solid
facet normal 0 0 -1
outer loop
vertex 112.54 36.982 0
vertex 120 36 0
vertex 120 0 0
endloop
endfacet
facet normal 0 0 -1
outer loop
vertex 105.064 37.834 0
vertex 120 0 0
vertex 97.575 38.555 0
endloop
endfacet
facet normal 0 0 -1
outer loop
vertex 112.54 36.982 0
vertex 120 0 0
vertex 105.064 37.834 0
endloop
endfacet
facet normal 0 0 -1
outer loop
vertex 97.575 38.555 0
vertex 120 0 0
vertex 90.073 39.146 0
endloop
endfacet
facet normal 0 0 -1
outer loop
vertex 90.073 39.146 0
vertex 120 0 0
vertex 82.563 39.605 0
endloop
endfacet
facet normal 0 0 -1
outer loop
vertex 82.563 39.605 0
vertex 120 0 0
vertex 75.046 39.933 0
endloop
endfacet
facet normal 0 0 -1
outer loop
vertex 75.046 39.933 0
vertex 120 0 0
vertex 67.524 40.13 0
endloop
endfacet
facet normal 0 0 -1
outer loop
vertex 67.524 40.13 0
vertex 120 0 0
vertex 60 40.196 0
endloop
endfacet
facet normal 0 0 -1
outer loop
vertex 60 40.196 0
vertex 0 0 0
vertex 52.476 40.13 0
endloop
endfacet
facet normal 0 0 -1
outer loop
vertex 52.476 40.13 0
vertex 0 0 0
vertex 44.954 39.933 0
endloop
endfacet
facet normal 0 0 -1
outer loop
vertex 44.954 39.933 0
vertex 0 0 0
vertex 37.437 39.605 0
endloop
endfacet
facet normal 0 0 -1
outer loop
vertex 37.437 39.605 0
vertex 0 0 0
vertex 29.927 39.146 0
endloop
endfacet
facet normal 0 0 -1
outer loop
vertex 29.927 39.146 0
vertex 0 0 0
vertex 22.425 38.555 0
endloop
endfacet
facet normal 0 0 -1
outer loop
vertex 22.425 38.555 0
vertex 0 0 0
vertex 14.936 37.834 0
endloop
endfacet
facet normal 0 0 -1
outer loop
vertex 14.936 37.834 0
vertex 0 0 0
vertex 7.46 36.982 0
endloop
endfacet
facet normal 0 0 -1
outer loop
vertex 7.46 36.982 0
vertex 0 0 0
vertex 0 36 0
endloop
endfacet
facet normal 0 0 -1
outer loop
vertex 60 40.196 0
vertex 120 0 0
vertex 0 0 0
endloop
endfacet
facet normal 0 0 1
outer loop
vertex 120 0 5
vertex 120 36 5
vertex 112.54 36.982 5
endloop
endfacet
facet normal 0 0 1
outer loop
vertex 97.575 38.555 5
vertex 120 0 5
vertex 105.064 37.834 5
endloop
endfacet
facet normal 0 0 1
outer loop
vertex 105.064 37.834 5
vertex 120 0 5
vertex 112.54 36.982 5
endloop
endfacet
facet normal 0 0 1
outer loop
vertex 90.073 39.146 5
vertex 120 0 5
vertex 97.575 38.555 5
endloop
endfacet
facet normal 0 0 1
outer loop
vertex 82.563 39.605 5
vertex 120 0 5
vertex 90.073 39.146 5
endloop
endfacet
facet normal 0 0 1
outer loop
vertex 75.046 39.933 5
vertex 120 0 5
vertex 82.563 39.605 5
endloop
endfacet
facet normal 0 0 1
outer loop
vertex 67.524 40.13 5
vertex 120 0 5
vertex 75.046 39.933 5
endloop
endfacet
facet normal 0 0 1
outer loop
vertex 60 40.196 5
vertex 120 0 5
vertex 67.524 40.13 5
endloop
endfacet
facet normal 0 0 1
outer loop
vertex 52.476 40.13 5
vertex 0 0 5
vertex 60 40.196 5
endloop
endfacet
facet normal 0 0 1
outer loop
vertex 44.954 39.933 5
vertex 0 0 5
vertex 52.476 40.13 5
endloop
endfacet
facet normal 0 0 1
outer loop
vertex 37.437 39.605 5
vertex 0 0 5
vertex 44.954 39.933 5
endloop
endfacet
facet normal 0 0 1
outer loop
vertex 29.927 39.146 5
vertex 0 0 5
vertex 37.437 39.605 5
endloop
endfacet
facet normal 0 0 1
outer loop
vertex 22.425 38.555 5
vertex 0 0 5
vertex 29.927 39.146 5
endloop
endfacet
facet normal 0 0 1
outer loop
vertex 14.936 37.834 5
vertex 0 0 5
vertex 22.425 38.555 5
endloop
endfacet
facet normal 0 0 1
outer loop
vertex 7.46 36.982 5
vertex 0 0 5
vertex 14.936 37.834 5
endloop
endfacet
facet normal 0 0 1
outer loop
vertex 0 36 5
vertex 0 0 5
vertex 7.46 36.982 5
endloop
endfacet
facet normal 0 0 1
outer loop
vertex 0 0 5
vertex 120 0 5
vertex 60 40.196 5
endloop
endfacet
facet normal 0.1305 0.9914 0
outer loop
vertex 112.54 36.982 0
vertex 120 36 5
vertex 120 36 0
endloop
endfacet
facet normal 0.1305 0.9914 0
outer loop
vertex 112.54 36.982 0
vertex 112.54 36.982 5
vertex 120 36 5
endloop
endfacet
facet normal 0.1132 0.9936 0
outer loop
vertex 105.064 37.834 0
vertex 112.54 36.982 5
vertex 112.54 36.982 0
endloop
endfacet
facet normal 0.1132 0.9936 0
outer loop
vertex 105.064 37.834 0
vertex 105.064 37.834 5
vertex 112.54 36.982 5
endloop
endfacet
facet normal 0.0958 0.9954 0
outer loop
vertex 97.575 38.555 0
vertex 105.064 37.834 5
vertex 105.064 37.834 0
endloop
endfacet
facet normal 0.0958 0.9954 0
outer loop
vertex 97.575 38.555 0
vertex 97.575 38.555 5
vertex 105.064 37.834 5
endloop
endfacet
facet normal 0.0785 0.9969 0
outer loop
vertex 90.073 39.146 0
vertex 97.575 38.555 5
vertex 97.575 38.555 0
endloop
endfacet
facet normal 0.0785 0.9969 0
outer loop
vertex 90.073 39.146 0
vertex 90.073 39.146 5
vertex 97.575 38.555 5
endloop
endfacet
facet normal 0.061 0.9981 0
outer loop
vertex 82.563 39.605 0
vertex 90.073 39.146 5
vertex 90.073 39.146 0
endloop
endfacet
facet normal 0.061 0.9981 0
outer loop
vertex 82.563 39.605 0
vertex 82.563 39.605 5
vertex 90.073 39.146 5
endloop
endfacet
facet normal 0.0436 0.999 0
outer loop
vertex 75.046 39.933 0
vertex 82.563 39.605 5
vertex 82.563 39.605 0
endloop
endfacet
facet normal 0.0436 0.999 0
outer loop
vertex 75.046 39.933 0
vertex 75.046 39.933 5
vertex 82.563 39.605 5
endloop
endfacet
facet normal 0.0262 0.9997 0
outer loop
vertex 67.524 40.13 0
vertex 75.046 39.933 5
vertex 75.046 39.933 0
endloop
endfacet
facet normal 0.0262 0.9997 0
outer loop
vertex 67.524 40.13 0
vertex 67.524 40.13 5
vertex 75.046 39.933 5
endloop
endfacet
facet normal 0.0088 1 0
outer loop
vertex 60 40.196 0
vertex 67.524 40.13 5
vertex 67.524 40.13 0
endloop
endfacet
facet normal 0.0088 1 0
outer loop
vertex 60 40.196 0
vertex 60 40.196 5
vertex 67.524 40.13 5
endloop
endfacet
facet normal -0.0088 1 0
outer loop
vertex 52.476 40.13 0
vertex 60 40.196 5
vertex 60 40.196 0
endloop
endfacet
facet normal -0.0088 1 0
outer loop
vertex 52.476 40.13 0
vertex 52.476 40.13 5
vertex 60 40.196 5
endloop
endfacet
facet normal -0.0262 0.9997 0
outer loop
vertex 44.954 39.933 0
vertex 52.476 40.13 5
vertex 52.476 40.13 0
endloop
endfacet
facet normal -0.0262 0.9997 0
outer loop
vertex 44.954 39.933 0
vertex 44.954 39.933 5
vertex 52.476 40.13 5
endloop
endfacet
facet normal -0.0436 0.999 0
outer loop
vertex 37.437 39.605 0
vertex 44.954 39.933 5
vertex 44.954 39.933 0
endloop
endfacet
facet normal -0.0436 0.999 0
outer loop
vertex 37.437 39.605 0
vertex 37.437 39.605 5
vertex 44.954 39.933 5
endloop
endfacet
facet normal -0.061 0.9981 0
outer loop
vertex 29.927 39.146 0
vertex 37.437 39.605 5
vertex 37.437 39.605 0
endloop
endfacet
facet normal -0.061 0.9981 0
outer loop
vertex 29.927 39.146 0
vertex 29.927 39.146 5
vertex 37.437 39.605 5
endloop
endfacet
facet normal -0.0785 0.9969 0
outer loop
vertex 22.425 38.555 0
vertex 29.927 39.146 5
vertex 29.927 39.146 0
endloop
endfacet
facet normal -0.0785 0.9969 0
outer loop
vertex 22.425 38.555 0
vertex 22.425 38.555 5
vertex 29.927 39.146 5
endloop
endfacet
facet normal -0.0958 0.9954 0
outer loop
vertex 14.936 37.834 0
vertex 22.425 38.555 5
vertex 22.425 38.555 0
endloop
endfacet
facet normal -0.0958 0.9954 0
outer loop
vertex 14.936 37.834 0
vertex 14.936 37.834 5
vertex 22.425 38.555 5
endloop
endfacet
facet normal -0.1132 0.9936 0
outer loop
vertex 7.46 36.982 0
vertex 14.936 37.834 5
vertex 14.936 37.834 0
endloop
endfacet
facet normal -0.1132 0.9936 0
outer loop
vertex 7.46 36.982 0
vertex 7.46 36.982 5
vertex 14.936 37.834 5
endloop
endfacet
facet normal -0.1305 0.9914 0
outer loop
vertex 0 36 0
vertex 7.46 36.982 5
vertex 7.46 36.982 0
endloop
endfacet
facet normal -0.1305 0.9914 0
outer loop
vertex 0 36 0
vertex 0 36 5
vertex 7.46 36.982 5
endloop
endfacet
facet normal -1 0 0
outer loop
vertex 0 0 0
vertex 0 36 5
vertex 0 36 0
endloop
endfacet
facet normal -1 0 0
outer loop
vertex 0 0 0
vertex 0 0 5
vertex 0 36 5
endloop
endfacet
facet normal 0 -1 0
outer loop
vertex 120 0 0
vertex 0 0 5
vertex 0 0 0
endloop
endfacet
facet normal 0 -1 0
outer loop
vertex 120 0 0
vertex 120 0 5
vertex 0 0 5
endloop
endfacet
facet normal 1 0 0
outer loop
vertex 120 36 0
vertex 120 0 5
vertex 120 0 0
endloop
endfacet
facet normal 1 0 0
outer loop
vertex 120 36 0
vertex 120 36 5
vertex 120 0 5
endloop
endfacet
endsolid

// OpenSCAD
$fn = 32;

// ----------------------------------------------------------------------
// Arc profile plate: crown, 19 points
// ----------------------------------------------------------------------

// --- parameters (mm) ---
bar_l = 120;              // bar length, X
bar_w = 36;               // bar height at the ends, Y
arc_r = 431.12;           // radius of the crown arc
arc_angle = 16;           // crown arc angle, degrees
crown_rise = 4.2;         // rise of the crown over the ends
arc_step = 1;             // sampling step of the crown arc, degrees
plate_t = 5;              // plate thickness, Z

bbox_y = bar_w + crown_rise;  // full height with the crown

profile = [[120, 36], [112.54, 36.982], [105.064, 37.834], [97.575, 38.555], [90.073, 39.146], [82.563, 39.605], [75.046, 39.933], [67.524, 40.13], [60, 40.196], [52.476, 40.13], [44.954, 39.933], [37.437, 39.605], [29.927, 39.146], [22.425, 38.555], [14.936, 37.834], [7.46, 36.982], [0, 36], [0, 0], [120, 0]];  // primary outline, 19 points, counter clockwise

// --- the one profile operation ---
linear_extrude(height = plate_t) polygon(points = profile);
